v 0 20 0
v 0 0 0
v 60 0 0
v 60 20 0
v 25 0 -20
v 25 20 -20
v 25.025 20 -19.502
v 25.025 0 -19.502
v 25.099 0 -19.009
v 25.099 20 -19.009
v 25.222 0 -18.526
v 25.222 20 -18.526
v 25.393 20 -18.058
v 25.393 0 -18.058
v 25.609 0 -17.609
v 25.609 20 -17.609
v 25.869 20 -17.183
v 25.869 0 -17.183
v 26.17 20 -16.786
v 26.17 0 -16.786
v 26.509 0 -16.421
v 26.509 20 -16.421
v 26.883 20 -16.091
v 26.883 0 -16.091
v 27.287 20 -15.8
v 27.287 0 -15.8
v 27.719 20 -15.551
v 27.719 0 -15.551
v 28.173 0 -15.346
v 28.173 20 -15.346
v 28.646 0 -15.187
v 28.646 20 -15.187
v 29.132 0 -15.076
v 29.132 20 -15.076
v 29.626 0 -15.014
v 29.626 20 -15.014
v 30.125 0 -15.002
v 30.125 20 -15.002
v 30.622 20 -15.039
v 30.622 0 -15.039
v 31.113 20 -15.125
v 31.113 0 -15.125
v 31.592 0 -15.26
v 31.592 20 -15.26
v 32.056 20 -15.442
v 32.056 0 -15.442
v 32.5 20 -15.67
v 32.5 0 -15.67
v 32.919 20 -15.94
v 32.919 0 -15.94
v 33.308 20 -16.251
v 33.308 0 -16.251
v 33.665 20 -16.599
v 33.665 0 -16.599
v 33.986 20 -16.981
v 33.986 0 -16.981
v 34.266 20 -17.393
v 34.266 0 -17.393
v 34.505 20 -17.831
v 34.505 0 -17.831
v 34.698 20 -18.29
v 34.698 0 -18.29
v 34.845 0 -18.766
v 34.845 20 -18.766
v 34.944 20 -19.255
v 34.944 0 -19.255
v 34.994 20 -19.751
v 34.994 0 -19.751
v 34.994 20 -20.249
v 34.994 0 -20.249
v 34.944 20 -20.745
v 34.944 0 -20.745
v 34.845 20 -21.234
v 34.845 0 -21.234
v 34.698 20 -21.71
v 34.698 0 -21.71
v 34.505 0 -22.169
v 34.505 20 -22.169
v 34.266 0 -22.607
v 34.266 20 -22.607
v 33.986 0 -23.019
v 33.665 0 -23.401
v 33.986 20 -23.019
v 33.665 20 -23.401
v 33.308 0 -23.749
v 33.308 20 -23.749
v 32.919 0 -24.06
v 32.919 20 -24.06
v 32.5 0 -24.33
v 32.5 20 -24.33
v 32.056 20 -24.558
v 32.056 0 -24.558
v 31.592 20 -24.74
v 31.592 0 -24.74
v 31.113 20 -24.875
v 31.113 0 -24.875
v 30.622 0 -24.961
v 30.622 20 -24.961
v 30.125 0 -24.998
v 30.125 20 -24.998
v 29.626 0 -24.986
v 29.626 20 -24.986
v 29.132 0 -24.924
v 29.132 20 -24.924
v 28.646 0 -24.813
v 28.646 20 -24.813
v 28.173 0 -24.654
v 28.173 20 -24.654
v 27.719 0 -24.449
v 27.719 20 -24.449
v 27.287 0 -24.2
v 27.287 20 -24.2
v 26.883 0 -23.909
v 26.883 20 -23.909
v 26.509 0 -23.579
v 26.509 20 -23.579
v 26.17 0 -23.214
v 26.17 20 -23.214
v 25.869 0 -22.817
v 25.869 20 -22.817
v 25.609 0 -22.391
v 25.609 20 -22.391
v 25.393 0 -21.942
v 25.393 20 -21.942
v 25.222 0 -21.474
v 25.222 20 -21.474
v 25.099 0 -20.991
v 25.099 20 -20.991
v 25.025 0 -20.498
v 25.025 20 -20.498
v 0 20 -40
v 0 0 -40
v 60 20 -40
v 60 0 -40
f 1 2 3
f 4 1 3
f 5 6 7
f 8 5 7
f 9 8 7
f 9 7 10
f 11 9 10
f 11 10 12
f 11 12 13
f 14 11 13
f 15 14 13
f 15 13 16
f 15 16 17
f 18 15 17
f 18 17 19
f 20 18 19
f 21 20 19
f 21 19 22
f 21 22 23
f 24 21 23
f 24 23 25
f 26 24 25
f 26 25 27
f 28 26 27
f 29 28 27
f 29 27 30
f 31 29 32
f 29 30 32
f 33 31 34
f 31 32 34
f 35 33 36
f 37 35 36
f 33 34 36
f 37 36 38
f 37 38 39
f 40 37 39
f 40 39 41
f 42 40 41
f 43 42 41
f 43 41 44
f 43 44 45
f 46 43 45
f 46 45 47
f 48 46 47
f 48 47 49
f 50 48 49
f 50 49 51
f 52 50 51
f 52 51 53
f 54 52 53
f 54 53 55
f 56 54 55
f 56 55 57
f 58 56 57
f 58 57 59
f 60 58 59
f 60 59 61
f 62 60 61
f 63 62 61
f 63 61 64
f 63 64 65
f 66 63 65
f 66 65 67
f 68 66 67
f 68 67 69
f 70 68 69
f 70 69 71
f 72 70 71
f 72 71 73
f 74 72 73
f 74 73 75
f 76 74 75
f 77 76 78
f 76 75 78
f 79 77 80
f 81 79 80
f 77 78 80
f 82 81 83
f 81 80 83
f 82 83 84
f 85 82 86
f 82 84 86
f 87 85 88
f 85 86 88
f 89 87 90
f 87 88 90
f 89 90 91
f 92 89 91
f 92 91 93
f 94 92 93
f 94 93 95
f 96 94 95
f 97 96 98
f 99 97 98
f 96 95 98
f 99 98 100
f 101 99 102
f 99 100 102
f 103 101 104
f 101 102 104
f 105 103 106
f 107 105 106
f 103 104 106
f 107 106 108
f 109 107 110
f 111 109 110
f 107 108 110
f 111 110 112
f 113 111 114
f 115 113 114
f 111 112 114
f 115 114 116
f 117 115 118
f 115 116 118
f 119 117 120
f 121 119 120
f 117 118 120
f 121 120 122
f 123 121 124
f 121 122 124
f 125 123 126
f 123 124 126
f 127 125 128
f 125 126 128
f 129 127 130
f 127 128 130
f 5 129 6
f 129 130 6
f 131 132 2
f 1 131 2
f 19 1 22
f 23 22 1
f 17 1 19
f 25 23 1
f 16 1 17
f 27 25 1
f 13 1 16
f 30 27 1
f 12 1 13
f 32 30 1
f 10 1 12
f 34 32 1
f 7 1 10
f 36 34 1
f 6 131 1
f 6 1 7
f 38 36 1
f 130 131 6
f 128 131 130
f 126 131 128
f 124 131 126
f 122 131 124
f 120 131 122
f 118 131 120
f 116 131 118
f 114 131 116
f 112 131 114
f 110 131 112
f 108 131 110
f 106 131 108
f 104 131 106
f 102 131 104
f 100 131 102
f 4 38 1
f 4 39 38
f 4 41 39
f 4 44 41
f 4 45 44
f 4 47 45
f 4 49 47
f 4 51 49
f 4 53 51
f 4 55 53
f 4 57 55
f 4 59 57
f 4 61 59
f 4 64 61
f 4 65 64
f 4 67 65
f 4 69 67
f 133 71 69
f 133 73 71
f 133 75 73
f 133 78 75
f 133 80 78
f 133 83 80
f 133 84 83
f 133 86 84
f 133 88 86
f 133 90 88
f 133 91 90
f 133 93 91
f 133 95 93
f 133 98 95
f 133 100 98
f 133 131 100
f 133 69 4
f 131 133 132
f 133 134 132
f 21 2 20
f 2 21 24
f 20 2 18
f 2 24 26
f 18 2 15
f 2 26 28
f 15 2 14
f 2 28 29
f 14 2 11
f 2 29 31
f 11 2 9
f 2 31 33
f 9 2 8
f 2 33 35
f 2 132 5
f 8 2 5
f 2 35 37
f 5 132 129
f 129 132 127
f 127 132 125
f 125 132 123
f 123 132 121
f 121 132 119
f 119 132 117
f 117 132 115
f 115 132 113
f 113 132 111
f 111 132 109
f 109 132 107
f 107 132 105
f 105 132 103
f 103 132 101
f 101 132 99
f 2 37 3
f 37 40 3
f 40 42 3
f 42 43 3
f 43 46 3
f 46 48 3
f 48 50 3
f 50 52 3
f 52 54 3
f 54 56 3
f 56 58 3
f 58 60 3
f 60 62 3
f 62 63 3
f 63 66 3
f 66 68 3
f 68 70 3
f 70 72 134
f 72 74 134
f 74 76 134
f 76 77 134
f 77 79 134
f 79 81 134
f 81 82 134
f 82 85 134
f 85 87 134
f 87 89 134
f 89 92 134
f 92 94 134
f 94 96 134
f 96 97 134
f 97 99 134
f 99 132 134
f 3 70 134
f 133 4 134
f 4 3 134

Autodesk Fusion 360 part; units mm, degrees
sketch "草图1" plane through (0, 0, 0) normal (0, 1, 0) x (1, 0, 0)
  line L0 (0, 0) -> (60, 0)
  line L1 (60, 0) -> (60, 40)
  line L2 (60, 40) -> (0, 40)
  line L3 (0, 40) -> (0, 0)
extrude "拉伸1" add sketch "草图1" along normal blind 20
sketch "草图2" plane through (0, 20, 0) normal (0, 1, 0) x (-1, 0, 0)
  line L0 (0, -40) -> (0, 0)
  line L1 (0, 0) -> (-60, 0)
  line L2 (-60, 0) -> (-60, -40)
  line L3 (-60, -40) -> (0, -40)
  line L4 (0, 0) -> (-60, -40) construction
  line L5 (0, -40) -> (-60, 0) construction
  circle A0 centre (-30, -20) radius 5
  dimension "d3" = 10
extrude "拉伸2" cut sketch "草图2" against normal through all contours A0
